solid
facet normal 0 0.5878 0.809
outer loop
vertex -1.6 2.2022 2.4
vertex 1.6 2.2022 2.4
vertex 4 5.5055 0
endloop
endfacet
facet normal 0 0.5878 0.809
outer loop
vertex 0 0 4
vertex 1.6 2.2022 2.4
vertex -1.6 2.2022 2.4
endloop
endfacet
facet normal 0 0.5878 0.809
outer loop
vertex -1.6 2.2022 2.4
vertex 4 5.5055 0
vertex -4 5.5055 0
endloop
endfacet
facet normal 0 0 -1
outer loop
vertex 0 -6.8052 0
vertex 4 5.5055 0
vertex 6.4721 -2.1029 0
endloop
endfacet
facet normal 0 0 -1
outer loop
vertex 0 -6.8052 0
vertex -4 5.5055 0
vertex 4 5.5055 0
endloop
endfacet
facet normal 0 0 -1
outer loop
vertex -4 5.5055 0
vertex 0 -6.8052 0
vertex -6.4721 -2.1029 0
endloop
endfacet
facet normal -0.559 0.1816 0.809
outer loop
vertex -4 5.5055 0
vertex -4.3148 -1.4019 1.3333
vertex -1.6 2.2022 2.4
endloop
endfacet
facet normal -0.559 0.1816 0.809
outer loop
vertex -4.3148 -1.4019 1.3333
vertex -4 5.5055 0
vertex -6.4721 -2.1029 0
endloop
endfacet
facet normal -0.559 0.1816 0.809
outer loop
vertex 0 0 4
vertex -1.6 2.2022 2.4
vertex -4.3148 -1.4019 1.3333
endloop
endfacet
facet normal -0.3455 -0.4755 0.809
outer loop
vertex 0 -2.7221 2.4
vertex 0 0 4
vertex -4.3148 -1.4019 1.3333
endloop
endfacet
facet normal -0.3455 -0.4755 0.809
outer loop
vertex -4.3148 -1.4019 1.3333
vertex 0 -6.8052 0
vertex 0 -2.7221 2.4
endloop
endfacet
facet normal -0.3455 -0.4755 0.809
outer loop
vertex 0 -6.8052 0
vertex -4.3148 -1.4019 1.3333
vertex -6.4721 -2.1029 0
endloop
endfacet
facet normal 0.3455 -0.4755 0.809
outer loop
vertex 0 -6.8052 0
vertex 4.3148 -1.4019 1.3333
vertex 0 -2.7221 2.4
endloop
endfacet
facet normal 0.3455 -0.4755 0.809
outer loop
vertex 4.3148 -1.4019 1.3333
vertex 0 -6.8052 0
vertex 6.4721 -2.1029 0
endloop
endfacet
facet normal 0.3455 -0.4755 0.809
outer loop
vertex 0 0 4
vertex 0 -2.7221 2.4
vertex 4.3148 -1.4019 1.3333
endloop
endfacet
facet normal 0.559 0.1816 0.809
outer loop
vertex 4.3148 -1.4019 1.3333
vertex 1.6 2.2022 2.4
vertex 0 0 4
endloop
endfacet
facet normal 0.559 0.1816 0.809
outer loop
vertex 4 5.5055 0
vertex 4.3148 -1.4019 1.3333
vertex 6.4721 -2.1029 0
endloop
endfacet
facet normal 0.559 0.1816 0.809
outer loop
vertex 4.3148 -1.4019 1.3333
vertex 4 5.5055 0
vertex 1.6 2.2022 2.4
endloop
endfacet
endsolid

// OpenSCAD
module rotated_cube(angle, magic_angle, cube_side, cube_height, cutoff_thickness = 4){
    rotate([magic_angle, 0, angle])
    translate([0, cutoff_thickness/2, cube_height/2])
    cube([cube_side, cutoff_thickness, cube_height], center = true);
    
    rotate([0, 0, angle])
    translate([0, cutoff_thickness/2, cube_height/2])
    cube([cube_side, cutoff_thickness, cube_height], center = true);
    
}

module the_pyramid(height, side_amount, cube_side){
    alpha = 360/side_amount;    //  Angle between the segments.
    beta = 90 - (alpha/2);      //  Angle between the radius and the side.
    l = tan(beta) * cube_side/2;     //  Apothem.
    gamma = atan(l/height);     //  The angle to skew by.
    
    cube_height = sqrt(pow(height, 2)+pow(l,2));
    r = cube_side/2 * 1/cos(beta);      //  Radius of the pyramid.
    echo(r);
    
    difference(){
        translate([0, 0, height/2])
        cylinder(height, r+0.1, r/10, center = true);
        for(i = [0:1:side_amount]){
           translate([-l*sin(360/side_amount*i), l*cos(360/side_amount*i), 0])
           rotated_cube(360/side_amount*i, gamma, cube_side*2, cube_height);
        };
    }
}

side_amount =   5;
cube_side = 8;

the_pyramid(cube_side/2, side_amount, cube_side);
